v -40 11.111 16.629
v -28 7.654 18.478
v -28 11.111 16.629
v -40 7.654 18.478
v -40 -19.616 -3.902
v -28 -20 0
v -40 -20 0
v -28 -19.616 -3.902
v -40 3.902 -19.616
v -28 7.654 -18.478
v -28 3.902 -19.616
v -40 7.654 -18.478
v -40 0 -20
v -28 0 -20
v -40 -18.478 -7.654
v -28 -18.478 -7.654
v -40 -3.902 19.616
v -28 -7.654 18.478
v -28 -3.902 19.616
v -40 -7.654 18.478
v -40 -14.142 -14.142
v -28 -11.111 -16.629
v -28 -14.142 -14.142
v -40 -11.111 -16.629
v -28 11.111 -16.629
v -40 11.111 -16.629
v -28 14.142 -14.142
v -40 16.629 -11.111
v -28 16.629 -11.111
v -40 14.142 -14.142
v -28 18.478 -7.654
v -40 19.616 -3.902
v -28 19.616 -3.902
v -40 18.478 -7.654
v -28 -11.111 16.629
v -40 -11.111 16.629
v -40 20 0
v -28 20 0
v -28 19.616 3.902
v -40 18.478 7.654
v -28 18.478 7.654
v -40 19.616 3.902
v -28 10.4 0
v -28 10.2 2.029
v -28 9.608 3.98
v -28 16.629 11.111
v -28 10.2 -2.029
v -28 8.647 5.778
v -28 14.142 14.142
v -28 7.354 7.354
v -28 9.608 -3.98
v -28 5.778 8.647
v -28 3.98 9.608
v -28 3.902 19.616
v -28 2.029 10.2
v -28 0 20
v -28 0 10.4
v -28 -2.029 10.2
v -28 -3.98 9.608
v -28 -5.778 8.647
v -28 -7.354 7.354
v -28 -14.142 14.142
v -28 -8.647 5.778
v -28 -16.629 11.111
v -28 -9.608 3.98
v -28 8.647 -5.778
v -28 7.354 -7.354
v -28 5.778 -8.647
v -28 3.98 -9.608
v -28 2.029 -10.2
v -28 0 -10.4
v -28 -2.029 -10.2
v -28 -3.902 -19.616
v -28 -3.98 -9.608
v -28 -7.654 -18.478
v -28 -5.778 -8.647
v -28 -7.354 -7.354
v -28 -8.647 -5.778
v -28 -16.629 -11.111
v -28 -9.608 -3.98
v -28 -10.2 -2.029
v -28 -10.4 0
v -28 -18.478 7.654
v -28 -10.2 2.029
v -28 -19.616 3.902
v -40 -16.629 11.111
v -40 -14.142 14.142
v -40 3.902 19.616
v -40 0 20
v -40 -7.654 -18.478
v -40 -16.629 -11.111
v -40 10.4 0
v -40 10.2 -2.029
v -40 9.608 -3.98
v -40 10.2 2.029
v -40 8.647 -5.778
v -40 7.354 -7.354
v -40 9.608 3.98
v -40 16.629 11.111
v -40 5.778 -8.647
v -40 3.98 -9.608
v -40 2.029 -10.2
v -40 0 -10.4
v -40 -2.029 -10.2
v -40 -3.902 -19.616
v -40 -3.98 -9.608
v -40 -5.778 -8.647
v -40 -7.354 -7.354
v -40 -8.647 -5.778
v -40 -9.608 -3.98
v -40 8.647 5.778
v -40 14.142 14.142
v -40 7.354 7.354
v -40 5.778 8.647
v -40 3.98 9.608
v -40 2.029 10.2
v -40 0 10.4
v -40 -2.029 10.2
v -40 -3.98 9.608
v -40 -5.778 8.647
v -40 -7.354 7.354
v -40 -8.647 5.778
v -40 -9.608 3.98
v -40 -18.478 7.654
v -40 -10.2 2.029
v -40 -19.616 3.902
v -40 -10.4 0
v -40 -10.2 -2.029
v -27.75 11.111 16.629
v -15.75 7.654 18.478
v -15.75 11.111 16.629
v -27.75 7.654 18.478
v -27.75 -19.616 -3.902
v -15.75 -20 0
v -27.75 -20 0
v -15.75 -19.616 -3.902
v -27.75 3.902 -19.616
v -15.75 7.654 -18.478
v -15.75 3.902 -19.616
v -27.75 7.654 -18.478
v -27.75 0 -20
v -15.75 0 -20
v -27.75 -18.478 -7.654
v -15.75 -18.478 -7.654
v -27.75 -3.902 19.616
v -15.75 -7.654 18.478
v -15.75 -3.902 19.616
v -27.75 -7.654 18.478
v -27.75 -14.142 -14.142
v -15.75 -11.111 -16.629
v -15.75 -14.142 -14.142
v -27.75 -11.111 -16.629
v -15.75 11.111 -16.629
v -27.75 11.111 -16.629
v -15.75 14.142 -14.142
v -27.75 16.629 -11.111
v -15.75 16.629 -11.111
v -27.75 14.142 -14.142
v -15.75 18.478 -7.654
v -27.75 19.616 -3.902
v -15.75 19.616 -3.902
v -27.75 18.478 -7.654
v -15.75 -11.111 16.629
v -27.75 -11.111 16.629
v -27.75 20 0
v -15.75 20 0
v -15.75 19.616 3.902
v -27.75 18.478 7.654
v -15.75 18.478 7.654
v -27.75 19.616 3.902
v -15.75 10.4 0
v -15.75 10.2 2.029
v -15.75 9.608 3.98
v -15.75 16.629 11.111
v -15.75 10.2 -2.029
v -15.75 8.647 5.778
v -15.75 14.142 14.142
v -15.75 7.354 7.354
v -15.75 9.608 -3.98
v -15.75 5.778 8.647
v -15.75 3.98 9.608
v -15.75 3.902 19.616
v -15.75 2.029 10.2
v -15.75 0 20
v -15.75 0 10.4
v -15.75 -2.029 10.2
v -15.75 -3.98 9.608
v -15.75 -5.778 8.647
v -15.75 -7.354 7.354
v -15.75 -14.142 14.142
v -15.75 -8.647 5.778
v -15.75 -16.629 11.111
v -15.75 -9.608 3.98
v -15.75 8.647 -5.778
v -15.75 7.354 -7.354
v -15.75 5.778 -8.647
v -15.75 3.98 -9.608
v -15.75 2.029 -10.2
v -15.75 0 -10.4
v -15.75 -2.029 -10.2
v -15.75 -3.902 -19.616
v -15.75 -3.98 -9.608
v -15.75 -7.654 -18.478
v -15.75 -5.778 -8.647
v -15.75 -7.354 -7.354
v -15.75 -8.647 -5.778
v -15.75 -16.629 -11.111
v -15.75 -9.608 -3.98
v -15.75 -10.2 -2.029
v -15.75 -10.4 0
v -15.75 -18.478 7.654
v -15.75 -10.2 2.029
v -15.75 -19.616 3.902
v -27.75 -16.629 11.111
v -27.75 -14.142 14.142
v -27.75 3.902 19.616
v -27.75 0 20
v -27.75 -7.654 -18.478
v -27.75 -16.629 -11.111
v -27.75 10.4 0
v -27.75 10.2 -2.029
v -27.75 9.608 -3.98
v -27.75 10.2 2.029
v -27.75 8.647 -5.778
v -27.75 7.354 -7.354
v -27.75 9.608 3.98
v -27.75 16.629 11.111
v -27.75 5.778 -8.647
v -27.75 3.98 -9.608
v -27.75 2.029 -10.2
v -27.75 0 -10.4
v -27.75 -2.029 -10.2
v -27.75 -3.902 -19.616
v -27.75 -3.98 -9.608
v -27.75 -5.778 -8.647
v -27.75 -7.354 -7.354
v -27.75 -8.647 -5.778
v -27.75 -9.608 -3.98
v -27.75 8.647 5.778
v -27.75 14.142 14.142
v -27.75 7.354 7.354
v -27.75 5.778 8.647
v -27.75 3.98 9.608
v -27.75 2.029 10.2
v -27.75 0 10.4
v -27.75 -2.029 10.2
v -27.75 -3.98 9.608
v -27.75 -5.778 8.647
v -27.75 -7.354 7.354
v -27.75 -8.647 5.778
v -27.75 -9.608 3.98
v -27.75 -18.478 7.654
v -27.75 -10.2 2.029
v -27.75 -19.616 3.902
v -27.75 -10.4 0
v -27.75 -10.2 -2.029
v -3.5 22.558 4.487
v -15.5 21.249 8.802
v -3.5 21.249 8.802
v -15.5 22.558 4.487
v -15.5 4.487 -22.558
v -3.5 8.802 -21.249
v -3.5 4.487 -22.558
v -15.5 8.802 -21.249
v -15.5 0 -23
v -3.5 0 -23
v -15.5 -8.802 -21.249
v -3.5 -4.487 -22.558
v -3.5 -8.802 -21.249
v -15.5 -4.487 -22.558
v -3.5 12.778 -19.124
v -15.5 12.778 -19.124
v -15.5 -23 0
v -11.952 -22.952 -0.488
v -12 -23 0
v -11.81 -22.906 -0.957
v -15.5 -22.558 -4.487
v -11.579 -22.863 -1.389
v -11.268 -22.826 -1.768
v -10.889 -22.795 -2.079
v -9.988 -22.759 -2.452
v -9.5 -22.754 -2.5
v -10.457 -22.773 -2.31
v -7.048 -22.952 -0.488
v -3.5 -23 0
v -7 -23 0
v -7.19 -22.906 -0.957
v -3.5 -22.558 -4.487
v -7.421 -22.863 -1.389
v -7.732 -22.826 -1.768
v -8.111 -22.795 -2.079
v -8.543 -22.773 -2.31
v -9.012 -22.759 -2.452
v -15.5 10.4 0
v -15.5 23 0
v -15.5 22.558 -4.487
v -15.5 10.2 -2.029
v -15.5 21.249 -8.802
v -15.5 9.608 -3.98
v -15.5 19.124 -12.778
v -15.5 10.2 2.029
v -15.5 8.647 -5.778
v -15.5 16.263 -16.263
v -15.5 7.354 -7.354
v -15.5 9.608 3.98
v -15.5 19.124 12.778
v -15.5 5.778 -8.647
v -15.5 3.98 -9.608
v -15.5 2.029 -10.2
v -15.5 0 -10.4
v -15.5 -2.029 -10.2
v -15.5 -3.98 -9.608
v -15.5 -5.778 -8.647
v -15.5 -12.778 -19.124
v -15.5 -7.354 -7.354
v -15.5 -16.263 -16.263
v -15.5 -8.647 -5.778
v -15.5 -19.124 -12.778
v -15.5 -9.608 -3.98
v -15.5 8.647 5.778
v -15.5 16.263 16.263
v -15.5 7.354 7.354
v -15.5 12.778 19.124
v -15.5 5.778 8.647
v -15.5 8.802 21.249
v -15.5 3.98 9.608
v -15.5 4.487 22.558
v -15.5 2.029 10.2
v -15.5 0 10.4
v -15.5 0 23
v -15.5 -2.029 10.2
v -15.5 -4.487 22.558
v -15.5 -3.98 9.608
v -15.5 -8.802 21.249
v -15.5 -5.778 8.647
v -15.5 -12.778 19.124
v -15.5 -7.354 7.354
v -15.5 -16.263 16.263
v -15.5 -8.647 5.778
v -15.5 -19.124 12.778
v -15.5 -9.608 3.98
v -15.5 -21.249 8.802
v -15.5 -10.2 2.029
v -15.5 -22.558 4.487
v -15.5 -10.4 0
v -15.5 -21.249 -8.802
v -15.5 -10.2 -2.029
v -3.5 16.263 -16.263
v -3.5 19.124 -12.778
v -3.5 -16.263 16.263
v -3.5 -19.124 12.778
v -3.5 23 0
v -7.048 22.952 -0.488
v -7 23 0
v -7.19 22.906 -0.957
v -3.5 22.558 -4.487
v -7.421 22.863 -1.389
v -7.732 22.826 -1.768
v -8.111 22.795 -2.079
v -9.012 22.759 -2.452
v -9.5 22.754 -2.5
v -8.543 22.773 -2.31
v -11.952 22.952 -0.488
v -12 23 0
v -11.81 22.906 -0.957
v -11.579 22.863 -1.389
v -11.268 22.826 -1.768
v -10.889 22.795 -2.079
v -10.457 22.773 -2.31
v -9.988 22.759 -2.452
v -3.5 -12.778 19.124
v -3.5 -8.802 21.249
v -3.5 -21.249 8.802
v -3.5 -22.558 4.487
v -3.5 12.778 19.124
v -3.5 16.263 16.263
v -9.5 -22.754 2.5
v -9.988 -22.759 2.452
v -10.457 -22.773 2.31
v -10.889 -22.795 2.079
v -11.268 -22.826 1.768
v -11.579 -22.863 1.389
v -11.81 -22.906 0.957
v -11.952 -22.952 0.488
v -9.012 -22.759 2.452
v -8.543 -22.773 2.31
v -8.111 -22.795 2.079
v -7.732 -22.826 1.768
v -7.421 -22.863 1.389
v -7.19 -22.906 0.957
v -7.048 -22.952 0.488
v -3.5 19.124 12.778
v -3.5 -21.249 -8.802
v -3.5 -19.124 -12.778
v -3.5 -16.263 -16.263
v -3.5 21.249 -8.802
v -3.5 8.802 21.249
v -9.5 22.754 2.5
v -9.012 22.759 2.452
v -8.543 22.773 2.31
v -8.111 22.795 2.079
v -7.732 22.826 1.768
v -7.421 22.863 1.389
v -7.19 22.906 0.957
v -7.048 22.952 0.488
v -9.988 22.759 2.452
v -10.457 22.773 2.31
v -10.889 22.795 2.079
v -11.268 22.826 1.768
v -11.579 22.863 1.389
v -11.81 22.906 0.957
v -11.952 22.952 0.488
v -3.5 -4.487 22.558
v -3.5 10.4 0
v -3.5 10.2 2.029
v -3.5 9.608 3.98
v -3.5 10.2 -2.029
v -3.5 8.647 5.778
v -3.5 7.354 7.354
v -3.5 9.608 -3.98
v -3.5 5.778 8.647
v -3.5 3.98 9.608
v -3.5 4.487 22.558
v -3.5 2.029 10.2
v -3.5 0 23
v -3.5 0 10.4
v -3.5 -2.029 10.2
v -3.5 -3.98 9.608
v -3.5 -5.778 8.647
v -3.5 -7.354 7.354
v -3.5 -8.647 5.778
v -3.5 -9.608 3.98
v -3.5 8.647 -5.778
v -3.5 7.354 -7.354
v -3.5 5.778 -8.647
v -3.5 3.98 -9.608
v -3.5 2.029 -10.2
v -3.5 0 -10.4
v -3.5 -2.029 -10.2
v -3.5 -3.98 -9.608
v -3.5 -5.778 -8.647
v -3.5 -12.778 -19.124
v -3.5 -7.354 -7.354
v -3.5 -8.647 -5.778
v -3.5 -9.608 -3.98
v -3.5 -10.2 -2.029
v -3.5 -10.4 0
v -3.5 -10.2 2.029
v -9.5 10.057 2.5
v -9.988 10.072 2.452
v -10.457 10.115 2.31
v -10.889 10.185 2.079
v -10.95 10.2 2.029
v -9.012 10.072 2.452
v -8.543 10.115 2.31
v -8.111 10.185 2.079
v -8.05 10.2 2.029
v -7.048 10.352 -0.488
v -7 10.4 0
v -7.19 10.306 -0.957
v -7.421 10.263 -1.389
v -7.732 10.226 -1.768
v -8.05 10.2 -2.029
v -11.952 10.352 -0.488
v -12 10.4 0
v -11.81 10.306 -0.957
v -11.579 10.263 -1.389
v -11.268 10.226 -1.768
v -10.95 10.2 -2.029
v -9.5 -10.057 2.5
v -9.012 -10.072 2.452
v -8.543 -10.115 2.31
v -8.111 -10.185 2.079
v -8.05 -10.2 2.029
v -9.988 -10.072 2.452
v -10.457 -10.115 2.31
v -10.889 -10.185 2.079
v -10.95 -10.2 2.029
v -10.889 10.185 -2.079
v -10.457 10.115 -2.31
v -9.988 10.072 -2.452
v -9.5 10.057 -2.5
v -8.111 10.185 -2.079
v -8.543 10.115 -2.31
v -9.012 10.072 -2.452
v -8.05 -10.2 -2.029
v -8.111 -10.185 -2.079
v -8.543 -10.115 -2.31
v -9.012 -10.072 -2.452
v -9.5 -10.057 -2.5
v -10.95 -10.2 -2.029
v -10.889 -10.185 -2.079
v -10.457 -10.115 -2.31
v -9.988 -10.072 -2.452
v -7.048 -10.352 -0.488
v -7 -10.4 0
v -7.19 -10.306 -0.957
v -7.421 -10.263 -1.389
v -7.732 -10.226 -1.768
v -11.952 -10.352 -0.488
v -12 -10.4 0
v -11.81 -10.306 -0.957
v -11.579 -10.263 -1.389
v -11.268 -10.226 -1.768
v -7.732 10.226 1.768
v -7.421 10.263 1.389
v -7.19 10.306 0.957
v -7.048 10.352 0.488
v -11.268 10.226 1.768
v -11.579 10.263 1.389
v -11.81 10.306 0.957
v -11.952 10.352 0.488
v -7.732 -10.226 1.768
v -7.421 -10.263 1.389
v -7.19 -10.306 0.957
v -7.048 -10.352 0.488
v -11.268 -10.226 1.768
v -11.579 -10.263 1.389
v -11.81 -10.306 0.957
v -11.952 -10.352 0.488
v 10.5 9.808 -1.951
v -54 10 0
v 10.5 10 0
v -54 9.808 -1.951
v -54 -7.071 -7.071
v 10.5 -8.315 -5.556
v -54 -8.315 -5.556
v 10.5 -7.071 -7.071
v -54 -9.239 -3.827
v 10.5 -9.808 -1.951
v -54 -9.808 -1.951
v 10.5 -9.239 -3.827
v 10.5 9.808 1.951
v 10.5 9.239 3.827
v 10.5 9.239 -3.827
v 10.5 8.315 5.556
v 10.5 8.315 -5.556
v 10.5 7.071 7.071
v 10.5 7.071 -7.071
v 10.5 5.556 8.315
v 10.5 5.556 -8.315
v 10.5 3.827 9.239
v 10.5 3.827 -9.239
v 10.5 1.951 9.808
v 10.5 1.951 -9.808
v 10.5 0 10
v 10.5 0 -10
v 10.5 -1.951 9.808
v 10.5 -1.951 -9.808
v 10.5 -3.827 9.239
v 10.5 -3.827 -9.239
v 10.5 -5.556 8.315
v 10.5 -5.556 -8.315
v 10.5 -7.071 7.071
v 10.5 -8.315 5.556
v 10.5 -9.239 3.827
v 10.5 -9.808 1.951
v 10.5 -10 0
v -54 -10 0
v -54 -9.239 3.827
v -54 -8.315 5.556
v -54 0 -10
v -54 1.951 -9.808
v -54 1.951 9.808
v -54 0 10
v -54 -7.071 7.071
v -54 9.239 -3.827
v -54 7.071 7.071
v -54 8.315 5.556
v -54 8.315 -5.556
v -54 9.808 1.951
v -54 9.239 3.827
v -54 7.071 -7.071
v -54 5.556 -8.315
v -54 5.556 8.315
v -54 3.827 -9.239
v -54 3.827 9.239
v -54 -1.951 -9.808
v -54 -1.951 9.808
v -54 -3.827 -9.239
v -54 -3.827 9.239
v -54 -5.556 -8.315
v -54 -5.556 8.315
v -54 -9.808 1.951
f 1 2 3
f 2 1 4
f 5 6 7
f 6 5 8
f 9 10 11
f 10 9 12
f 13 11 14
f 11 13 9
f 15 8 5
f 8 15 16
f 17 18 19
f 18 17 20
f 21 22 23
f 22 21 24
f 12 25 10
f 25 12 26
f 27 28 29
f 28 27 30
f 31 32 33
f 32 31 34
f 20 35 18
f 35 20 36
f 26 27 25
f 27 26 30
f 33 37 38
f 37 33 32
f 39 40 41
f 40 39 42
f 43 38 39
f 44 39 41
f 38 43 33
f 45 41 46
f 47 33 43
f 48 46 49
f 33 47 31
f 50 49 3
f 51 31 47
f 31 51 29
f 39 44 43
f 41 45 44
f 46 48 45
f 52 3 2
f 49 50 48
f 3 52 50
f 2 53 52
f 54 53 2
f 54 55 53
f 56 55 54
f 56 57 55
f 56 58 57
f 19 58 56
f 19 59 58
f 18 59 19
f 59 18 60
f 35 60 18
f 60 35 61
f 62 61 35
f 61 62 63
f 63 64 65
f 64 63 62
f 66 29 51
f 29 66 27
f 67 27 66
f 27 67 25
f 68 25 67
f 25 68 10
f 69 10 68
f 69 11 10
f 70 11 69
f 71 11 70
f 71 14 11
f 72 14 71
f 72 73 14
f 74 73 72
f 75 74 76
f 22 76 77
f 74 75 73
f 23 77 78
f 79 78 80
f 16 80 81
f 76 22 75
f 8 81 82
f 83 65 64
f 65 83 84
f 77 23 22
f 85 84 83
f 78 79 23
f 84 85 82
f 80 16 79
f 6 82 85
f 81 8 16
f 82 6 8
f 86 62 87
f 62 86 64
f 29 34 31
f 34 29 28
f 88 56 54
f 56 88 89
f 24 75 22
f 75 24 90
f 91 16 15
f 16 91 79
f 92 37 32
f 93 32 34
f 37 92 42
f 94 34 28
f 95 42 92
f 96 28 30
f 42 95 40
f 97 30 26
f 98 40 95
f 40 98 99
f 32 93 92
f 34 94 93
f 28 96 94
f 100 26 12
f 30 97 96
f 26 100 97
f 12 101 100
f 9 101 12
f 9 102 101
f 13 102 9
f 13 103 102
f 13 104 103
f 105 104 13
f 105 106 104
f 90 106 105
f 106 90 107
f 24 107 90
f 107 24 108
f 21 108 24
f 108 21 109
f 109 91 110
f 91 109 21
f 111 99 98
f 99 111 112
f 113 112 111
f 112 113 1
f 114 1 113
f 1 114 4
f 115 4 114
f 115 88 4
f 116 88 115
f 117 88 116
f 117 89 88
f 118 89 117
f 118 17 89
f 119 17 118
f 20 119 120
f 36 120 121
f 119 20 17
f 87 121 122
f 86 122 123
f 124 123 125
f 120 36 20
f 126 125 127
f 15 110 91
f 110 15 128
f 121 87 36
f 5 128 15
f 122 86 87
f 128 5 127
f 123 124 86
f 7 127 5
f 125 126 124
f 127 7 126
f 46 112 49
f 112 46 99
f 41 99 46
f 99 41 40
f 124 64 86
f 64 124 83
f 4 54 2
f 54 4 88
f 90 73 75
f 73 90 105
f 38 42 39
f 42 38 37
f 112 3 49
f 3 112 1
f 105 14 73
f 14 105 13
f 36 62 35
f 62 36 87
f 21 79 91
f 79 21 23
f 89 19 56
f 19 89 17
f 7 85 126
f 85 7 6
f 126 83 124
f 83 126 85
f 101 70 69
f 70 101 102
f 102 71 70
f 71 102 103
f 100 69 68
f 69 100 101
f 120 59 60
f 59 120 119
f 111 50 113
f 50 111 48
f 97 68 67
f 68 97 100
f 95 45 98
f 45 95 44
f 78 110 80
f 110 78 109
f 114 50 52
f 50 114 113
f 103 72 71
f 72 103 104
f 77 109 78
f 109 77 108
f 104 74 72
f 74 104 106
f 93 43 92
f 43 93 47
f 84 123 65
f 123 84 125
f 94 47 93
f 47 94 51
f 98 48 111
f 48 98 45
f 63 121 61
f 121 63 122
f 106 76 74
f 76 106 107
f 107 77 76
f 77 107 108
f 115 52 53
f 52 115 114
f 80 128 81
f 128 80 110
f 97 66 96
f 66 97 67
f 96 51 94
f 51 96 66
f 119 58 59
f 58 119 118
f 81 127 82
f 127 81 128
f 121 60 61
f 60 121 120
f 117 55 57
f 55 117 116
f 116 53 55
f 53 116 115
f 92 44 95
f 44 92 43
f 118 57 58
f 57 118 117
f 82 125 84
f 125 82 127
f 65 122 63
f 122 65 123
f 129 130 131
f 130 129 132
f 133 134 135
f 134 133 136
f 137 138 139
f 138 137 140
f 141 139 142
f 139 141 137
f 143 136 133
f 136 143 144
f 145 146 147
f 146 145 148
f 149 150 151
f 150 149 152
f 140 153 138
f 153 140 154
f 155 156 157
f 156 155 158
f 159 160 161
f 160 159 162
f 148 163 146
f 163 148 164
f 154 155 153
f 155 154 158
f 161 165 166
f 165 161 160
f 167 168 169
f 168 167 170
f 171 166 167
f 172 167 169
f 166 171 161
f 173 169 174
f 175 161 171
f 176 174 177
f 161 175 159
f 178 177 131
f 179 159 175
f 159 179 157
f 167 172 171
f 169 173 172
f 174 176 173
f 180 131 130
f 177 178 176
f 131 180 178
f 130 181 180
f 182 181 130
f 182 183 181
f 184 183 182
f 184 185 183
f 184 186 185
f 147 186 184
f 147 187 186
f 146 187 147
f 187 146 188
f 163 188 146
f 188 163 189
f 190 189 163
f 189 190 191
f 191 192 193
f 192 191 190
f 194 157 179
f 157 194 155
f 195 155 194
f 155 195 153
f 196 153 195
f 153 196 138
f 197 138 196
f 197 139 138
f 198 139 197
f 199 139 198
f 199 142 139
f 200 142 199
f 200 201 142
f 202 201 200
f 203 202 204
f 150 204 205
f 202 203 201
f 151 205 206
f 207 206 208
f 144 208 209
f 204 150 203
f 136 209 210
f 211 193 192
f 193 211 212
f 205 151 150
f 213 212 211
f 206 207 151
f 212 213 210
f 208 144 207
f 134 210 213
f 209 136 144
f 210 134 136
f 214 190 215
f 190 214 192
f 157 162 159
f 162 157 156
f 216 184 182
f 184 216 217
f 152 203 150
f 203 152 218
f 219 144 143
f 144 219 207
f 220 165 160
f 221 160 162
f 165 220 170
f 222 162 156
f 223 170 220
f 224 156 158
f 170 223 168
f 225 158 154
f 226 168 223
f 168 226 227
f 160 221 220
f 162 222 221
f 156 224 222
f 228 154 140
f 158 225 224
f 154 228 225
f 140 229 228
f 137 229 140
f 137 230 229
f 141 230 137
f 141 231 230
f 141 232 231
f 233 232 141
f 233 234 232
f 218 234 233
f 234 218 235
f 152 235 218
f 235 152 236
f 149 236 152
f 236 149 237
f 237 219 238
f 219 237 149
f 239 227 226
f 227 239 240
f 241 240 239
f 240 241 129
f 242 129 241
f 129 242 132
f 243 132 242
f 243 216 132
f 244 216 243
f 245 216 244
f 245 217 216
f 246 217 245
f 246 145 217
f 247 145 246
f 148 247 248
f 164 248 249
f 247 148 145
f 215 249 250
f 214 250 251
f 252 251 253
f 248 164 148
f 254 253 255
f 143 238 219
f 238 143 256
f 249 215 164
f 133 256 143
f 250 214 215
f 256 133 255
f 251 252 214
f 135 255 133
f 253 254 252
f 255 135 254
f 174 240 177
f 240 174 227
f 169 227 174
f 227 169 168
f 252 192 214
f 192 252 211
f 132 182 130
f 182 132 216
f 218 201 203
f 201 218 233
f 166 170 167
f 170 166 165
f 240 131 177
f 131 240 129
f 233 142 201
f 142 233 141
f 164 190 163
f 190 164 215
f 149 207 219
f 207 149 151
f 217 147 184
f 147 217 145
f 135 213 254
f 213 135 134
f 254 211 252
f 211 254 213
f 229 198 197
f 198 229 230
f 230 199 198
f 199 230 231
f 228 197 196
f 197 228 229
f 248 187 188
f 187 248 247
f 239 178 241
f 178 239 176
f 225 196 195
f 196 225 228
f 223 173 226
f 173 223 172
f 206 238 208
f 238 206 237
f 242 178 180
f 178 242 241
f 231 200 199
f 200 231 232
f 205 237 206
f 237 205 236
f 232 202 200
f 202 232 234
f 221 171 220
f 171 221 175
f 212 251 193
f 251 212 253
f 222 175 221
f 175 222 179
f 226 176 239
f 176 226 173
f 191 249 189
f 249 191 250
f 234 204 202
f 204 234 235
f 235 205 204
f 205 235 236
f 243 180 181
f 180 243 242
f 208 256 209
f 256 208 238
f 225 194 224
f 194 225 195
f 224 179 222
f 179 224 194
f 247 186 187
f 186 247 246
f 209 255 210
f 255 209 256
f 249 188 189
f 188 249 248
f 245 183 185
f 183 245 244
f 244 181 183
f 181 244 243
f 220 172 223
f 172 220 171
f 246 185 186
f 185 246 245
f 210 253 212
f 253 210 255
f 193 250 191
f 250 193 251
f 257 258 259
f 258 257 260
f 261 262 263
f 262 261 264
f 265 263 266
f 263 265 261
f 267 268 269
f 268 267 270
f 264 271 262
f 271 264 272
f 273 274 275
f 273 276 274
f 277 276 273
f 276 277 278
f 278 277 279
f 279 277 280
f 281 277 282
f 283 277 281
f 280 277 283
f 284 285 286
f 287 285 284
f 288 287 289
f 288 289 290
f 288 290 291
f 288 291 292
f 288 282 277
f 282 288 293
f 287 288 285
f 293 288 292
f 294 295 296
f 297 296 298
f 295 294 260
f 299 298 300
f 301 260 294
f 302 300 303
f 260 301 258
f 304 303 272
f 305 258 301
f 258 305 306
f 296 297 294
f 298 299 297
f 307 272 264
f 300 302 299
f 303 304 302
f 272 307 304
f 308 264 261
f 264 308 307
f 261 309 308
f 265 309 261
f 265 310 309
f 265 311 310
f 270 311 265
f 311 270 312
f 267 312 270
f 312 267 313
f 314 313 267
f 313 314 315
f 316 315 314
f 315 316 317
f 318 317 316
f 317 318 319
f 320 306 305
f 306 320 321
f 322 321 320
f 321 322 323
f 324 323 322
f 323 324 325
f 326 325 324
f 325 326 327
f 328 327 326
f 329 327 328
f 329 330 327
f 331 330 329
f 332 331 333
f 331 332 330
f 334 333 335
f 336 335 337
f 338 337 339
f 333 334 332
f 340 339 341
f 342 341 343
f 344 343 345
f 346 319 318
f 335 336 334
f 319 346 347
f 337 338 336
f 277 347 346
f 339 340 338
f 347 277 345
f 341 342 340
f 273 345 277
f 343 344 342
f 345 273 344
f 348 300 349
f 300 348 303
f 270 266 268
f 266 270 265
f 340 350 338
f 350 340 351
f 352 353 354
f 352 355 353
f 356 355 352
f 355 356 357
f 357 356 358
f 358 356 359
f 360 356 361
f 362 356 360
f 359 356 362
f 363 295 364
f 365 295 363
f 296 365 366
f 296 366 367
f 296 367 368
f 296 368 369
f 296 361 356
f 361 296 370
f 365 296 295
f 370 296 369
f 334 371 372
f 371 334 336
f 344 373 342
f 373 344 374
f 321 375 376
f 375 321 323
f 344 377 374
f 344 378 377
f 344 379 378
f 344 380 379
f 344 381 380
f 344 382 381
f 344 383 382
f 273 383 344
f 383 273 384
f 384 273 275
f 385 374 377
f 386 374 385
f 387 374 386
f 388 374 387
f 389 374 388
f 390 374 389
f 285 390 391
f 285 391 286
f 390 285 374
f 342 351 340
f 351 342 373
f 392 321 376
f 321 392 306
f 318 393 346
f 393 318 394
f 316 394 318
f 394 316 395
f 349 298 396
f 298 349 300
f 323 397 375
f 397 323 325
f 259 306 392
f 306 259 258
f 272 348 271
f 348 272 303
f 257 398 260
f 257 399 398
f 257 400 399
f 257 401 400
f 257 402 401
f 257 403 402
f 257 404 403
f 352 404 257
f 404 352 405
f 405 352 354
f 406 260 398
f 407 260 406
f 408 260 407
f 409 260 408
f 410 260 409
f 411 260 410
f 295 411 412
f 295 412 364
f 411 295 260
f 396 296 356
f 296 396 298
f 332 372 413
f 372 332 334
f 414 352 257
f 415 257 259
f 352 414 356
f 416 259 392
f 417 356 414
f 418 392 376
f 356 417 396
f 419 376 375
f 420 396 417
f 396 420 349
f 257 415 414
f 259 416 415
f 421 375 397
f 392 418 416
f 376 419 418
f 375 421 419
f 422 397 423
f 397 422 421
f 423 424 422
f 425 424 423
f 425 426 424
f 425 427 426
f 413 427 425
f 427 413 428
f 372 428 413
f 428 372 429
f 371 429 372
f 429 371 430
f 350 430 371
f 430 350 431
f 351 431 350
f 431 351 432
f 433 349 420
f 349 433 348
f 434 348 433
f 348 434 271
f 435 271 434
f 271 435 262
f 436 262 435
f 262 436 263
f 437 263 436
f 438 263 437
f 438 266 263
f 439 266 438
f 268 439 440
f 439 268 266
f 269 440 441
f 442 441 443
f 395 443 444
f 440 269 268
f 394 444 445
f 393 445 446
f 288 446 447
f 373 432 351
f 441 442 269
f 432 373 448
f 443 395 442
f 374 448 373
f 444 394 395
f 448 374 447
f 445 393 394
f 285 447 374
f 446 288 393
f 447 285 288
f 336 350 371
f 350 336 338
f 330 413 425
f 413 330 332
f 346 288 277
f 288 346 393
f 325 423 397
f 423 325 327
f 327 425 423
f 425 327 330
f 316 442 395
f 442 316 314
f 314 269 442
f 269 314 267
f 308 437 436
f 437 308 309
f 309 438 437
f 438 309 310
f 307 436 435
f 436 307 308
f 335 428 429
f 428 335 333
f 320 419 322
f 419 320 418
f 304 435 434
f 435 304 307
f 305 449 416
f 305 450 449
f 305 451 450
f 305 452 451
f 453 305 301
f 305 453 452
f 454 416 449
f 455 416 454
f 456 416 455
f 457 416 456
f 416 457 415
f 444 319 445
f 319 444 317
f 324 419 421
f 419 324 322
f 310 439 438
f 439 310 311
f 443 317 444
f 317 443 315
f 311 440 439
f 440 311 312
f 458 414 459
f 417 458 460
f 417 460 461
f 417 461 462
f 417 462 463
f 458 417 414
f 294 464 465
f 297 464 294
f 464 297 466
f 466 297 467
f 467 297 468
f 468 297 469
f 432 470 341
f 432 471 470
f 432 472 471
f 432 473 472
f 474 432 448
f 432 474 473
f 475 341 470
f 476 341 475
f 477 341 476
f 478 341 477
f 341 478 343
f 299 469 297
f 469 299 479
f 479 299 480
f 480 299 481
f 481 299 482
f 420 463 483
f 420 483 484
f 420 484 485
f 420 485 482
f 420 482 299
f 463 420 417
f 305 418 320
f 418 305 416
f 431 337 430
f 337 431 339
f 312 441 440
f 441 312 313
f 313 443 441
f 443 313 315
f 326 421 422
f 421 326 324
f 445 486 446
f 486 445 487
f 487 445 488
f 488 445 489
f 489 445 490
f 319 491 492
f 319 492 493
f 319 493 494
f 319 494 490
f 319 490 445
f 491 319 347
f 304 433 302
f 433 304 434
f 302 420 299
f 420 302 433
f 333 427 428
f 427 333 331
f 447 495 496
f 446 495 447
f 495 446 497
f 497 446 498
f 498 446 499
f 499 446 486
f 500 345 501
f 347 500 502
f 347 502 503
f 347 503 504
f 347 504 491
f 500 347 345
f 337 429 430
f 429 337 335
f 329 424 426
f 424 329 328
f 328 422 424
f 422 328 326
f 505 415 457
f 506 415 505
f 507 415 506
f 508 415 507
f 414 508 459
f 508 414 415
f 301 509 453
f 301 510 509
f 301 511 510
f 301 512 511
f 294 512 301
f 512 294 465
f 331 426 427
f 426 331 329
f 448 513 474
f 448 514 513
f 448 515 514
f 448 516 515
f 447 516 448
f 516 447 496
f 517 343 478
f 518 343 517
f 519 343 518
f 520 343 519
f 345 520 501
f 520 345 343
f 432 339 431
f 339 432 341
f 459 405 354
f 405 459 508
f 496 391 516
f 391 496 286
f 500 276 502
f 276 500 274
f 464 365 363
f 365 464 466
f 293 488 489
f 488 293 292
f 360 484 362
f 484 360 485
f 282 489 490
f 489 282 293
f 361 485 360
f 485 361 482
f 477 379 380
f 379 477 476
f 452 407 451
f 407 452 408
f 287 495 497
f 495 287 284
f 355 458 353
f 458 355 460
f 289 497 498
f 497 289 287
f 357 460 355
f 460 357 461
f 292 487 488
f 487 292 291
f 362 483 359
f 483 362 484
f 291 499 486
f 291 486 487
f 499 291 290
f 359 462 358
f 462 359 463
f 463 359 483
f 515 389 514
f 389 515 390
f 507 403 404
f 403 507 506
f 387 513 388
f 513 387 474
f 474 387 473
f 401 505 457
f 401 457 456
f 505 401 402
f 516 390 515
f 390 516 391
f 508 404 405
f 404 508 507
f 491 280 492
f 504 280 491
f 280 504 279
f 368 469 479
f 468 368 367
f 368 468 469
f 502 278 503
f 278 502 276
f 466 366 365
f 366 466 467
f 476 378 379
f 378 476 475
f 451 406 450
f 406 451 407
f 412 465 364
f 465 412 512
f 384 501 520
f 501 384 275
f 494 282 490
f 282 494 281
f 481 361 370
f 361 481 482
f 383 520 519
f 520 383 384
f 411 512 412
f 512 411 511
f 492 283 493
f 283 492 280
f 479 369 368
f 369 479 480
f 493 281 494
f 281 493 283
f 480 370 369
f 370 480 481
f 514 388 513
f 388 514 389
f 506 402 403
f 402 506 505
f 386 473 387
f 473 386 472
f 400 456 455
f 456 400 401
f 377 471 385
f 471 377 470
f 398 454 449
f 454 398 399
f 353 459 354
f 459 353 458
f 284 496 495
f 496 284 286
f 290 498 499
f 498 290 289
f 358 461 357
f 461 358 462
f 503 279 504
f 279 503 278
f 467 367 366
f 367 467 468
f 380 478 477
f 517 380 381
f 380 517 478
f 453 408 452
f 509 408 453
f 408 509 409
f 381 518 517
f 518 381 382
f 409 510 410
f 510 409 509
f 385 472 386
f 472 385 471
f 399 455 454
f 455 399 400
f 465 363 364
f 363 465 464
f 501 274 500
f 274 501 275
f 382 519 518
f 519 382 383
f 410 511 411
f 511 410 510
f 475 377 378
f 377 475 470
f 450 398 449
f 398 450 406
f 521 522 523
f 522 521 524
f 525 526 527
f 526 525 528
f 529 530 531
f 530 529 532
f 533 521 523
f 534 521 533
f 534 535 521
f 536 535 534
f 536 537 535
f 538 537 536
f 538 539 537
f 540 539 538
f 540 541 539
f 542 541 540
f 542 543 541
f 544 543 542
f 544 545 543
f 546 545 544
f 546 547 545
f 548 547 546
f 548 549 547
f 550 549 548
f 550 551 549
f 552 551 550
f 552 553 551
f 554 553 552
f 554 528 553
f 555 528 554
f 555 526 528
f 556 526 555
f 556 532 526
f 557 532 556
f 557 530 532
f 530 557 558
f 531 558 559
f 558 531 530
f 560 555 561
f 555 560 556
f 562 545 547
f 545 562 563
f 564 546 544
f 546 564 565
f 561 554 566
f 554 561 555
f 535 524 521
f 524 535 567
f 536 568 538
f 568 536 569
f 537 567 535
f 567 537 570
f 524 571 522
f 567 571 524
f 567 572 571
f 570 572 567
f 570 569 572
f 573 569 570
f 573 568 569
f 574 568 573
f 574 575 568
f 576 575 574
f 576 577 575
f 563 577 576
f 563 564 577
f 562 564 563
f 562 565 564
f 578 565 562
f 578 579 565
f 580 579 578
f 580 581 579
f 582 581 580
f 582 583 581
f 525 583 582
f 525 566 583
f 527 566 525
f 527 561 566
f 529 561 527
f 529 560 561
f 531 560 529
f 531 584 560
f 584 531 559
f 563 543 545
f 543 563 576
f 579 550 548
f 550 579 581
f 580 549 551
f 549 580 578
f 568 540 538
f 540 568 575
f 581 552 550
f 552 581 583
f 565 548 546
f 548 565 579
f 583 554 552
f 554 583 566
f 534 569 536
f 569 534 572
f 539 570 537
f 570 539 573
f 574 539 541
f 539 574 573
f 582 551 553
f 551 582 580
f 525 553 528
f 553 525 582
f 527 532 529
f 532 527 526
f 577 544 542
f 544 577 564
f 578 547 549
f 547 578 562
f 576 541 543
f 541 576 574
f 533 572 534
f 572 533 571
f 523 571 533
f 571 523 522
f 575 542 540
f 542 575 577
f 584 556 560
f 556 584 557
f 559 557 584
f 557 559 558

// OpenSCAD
$fn = 32;

// ------------------------------------------------------------------------
// Shaft with rings and collars: d20 shaft, 3 rings
// Every part is its own module, assembly() places them once.
// ------------------------------------------------------------------------

// --- part 1 ---
module shaft() {
  translate([0, 0, -32.25]) cylinder(h = 64.5, d = 20);
}

// --- part 2 ---
module spacer_a() {
  difference() {
      translate([0, 0, 0]) cylinder(h = 12, d = 40);
      translate([0, 0, -1]) cylinder(h = 14, d = 20.8);
    }
}

// --- part 3 ---
module spacer_b() {
  difference() {
      translate([0, 0, 0]) cylinder(h = 12, d = 40);
      translate([0, 0, -1]) cylinder(h = 14, d = 20.8);
    }
}

// --- part 4 ---
module collar_a() {
  difference() {
    cylinder(h = 12, d = 46);
    translate([0, 0, -1]) cylinder(h = 14, d = 20.8);
    translate([0, 0, 6]) rotate([90, 0, 0]) cylinder(h = 48, d = 5, center = true);
  }
}

// --- assembly ---
module assembly() {
  translate([-21.75, 0, 0]) rotate([0, 90, 0]) shaft();
  translate([-40, 0, 0]) rotate([0, 90, 0]) spacer_a();
  translate([-27.75, 0, 0]) rotate([0, 90, 0]) spacer_b();
  translate([-15.5, 0, 0]) rotate([0, 90, 0]) collar_a();
}

assembly();
